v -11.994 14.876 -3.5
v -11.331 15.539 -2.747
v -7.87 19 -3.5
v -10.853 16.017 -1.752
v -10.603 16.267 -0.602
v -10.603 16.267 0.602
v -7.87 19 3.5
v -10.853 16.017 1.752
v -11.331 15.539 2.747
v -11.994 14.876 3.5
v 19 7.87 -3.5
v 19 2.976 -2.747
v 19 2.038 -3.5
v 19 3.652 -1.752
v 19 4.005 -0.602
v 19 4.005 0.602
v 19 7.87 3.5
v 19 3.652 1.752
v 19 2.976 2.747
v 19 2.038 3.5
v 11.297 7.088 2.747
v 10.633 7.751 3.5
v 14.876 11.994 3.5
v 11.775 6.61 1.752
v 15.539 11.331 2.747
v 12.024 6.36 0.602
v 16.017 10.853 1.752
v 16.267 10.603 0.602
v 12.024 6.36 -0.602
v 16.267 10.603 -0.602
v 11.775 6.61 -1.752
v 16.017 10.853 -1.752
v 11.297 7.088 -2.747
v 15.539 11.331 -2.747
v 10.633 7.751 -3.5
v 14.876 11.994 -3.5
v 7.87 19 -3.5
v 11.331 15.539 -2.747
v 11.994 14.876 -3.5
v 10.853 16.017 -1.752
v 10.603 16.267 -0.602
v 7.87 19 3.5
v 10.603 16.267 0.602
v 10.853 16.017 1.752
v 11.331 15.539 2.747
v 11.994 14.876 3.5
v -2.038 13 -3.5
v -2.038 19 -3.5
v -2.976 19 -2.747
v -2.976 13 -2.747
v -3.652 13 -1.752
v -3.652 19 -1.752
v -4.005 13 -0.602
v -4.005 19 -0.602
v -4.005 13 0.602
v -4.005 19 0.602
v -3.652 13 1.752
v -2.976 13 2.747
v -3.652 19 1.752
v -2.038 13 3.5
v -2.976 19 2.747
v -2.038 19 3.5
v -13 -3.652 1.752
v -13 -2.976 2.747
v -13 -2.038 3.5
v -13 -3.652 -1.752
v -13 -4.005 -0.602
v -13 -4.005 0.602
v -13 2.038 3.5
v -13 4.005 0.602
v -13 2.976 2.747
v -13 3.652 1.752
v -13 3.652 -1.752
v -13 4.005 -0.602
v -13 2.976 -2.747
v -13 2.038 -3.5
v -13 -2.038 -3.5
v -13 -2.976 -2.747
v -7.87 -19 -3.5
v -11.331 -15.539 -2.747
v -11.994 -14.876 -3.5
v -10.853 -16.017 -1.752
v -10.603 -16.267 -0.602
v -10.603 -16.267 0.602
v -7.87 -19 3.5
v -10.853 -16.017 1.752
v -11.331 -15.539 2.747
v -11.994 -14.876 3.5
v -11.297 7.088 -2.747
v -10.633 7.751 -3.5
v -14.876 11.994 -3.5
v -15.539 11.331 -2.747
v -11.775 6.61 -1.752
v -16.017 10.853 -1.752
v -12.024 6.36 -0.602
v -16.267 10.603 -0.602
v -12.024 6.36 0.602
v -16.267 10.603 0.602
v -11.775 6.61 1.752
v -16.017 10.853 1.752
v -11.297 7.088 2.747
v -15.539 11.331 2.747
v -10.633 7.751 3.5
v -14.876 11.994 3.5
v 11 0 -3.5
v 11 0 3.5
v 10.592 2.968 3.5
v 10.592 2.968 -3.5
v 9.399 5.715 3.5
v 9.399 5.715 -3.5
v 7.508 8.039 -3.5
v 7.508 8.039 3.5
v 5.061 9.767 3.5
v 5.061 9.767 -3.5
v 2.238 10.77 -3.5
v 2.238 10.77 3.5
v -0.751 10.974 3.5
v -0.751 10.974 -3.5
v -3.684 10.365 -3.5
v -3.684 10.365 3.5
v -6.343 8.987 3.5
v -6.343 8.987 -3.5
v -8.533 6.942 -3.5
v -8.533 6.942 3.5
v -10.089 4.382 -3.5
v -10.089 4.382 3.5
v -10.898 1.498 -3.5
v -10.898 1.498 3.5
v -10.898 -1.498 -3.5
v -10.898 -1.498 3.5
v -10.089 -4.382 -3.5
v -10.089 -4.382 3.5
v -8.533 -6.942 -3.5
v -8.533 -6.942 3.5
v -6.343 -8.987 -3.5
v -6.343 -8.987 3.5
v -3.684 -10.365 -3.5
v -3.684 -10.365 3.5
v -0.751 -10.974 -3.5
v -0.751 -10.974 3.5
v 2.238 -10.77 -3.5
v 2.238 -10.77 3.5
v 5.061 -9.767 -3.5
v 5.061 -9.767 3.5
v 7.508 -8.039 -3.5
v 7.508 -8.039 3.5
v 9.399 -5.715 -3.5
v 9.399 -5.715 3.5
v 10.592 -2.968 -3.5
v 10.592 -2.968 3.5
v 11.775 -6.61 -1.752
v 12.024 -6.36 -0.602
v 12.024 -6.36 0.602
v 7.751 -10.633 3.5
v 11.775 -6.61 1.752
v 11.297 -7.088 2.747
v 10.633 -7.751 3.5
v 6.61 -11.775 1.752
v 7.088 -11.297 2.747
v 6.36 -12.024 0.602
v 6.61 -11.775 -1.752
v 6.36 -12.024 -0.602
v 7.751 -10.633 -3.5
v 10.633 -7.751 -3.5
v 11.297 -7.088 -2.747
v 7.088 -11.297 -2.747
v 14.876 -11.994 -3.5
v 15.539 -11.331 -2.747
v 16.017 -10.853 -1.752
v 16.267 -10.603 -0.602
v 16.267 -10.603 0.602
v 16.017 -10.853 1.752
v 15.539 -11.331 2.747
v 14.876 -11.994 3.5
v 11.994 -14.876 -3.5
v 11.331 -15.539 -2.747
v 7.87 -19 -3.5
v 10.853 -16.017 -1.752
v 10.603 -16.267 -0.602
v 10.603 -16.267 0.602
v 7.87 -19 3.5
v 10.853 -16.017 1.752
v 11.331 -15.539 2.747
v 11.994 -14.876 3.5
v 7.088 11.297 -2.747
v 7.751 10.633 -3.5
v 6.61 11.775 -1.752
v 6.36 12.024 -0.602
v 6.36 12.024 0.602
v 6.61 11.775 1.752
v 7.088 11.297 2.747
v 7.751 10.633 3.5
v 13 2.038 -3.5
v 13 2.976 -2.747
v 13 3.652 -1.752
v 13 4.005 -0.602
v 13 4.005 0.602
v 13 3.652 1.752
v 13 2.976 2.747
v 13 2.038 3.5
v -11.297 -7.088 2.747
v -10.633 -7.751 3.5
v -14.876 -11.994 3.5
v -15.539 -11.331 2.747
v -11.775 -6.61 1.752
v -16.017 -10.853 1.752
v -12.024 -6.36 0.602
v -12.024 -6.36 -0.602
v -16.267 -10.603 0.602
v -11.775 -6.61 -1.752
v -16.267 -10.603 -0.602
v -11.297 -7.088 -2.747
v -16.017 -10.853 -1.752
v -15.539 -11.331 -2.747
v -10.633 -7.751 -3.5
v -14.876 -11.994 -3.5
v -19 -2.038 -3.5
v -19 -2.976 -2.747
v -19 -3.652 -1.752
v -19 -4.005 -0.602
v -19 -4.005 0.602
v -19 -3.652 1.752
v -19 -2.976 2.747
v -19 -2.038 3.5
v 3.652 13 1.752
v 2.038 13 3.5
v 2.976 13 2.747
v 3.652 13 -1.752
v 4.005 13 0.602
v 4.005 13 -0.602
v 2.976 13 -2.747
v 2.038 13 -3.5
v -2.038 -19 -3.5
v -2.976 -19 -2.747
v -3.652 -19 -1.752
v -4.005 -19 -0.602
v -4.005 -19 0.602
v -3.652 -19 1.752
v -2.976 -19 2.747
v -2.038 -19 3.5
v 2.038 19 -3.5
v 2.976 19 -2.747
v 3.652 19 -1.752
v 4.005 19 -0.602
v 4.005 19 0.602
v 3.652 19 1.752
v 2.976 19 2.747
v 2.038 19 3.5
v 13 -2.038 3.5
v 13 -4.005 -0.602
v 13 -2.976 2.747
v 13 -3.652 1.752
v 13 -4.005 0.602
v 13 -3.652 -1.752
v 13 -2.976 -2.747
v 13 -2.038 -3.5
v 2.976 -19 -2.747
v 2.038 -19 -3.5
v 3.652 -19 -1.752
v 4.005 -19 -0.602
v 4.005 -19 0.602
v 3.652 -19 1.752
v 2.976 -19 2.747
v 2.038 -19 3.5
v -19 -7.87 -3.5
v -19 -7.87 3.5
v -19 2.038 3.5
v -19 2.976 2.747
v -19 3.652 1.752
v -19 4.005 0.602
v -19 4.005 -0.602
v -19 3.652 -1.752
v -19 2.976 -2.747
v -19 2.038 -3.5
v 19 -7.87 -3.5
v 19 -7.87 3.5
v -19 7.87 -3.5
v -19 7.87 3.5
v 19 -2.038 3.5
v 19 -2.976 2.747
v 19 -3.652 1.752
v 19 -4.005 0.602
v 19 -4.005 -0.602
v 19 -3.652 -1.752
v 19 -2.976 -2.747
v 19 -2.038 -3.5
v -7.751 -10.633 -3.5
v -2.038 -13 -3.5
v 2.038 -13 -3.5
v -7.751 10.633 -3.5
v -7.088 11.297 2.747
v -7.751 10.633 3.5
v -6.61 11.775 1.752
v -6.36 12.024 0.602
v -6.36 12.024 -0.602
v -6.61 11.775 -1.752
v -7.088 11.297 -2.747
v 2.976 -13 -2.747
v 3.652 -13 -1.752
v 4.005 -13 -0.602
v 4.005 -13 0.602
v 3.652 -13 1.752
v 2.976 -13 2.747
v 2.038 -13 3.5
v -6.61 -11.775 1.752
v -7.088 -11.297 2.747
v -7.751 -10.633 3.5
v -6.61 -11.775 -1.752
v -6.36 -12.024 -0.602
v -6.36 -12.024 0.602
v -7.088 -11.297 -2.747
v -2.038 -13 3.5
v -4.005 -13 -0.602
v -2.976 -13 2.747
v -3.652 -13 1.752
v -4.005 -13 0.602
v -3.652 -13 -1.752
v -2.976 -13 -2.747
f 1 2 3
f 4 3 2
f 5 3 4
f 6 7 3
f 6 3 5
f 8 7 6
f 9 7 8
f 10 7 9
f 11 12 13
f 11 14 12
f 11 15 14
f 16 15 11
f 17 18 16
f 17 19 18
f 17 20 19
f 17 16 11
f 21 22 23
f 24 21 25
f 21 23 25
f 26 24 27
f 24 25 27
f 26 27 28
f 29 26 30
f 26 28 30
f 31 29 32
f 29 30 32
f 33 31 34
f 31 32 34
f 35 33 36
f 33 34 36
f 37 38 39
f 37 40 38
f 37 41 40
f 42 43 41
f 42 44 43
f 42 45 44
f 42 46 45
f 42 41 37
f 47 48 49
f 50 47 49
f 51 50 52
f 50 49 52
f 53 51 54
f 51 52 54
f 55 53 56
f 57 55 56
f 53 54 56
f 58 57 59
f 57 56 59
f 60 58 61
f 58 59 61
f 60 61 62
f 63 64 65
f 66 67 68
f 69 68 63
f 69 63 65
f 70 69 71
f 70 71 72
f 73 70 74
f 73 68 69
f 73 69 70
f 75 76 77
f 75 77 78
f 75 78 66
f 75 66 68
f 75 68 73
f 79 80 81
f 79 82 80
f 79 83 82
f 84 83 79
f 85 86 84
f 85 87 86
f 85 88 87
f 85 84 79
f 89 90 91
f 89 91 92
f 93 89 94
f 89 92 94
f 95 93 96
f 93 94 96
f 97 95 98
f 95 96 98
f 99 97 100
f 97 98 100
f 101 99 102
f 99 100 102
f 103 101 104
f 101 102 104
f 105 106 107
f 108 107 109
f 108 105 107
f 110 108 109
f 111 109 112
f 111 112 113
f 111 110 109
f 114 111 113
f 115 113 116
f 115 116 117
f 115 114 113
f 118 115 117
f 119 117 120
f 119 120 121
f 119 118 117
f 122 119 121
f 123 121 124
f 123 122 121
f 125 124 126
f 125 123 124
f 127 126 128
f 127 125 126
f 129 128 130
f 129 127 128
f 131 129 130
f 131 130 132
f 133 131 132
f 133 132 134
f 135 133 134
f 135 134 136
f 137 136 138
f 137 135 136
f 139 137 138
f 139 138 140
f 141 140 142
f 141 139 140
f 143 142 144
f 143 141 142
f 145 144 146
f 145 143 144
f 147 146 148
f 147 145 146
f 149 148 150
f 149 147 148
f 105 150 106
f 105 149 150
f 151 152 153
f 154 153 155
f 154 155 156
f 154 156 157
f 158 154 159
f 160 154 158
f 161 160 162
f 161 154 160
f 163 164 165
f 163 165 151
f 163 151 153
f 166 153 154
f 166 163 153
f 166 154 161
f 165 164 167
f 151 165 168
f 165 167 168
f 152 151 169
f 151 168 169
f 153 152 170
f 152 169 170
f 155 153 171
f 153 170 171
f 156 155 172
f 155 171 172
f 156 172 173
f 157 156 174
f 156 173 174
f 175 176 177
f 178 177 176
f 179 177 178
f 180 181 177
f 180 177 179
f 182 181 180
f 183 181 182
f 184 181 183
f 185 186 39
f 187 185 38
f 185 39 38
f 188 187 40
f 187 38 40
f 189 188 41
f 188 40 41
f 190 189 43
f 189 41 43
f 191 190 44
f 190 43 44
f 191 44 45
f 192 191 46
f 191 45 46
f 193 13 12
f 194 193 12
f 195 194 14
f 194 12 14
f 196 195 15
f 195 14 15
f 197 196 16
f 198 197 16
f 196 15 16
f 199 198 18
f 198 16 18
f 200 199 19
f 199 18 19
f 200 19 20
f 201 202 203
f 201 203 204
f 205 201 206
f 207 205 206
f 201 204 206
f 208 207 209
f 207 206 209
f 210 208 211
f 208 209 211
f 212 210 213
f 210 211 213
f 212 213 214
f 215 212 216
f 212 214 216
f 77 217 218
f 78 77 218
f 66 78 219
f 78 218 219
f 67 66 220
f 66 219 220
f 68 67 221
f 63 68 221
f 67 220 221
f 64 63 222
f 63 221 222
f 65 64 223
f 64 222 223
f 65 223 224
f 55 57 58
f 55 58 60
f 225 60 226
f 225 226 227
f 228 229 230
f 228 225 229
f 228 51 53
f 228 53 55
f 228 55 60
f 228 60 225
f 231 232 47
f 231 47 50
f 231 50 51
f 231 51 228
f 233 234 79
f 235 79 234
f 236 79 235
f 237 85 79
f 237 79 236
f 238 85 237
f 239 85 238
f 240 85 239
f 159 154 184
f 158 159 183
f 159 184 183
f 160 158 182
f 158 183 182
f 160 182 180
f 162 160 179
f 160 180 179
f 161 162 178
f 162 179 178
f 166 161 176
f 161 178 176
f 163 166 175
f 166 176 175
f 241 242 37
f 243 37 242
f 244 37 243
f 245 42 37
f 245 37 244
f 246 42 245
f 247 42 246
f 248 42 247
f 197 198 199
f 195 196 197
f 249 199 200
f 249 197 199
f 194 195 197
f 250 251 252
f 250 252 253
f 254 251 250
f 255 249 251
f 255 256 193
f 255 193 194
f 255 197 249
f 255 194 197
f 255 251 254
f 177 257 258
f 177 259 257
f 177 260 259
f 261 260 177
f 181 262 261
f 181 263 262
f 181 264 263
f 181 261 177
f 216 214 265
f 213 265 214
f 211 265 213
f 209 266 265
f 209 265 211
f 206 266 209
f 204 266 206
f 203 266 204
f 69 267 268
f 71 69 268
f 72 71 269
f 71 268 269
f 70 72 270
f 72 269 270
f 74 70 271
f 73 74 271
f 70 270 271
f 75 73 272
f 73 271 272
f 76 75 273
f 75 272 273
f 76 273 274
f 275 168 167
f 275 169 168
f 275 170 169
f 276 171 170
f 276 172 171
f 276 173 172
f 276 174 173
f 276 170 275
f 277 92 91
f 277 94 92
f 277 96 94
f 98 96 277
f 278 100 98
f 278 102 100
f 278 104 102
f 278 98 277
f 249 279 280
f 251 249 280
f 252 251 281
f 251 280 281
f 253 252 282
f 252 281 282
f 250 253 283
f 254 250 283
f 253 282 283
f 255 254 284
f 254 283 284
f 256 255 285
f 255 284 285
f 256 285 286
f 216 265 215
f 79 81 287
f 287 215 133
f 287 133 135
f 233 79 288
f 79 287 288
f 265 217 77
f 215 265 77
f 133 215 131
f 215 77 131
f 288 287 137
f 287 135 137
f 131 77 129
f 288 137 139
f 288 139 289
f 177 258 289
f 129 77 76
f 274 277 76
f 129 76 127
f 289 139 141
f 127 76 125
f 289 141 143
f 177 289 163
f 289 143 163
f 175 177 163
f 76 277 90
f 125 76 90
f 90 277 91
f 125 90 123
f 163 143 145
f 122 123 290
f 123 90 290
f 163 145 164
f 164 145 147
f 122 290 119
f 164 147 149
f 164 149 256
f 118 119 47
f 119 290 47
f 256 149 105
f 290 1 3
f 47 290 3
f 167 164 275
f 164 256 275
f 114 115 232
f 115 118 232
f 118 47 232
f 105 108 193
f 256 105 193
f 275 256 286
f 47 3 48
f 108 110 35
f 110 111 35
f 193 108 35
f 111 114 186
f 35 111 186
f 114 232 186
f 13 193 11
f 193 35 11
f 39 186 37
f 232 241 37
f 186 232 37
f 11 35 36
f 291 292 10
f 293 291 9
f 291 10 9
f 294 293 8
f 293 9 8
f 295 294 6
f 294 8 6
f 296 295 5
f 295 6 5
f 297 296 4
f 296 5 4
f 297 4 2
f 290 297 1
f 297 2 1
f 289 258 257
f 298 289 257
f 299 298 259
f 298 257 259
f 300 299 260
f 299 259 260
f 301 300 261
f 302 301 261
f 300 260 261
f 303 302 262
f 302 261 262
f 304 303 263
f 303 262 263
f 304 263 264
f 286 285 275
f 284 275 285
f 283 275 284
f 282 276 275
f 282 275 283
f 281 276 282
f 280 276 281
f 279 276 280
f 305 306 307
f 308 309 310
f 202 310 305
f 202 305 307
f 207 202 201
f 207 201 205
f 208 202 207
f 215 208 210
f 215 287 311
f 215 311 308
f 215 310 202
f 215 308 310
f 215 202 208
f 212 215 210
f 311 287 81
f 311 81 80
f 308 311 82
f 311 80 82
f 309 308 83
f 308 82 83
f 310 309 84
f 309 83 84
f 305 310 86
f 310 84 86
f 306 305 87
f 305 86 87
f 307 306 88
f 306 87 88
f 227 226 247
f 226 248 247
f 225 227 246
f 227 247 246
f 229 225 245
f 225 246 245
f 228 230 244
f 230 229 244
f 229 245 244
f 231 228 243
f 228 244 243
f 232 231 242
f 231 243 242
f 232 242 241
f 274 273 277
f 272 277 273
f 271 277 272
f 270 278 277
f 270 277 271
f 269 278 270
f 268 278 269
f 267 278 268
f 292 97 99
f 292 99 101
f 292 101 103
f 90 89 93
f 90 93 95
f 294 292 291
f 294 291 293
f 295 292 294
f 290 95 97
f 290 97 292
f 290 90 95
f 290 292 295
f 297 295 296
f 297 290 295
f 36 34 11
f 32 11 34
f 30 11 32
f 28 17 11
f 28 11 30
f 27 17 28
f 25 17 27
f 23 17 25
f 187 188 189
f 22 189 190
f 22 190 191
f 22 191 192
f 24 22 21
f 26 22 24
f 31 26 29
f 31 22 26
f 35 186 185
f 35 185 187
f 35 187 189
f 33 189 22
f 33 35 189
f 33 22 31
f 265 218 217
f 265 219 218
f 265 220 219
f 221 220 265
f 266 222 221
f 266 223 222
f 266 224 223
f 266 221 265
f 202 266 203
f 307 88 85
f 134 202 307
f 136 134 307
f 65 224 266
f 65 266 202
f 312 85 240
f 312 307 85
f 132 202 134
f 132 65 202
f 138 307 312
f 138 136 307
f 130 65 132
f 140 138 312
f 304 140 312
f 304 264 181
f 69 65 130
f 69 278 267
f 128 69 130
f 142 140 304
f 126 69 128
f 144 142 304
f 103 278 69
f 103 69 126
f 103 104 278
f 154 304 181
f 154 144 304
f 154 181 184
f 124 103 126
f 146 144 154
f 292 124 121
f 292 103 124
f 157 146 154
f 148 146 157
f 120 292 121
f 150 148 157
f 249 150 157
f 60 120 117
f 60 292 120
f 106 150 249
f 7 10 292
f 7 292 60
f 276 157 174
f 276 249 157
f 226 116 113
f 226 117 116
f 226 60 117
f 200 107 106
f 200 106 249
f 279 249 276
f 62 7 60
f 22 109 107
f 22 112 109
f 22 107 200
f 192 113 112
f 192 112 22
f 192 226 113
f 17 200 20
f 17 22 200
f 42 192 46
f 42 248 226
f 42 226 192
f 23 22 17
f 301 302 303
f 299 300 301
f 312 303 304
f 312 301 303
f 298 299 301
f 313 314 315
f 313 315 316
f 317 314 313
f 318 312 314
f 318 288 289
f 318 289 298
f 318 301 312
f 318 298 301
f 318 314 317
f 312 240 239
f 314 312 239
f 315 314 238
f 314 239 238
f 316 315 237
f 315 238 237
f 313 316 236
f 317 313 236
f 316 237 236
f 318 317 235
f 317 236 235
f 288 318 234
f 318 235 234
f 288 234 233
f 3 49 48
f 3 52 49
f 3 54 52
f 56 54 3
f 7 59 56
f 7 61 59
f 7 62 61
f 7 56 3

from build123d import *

# Parameters (mm, degrees)
SKETCH1_R           = 11
BOSS_EXTRUDE1_DEPTH = 3.5
SKETCH2_R           = 4.05
CUT_EXTRUDE3_DEPTH  = 6
CIRPATTERN1_COUNT   = 8


with BuildPart() as part:
    # Sketch1 → Boss-Extrude1 (new, symmetric)
    with BuildSketch(Plane.XY):
        Polygon((7.870057685, 19), (-7.870057685, 19), (-19, 7.870057685), (-19, -7.870057685), (-7.870057685, -19), (7.870057685, -19), (19, -7.870057685), (19, 7.870057685), align=None)
        Circle(SKETCH1_R, mode=Mode.SUBTRACT)
    extrude(amount=BOSS_EXTRUDE1_DEPTH, both=True)

    # Sketch2 → Cut-Extrude3 (cut)
    with BuildSketch(Plane(origin=(0, -19, 0), x_dir=(-1, 0, 0), z_dir=(0, -1, 0))):
        Circle(SKETCH2_R)
    cut_extrude3 = extrude(amount=-CUT_EXTRUDE3_DEPTH, mode=Mode.SUBTRACT)

    # CirPattern1: Cut-Extrude3 ×8 about axis
    cirpattern1_axis = Axis((0, 0, 3.5), (0, 0, 1))
    for i in range(1, CIRPATTERN1_COUNT):
        add(cut_extrude3.rotate(cirpattern1_axis, i * 360 / CIRPATTERN1_COUNT), mode=Mode.SUBTRACT)


solid = part.part
